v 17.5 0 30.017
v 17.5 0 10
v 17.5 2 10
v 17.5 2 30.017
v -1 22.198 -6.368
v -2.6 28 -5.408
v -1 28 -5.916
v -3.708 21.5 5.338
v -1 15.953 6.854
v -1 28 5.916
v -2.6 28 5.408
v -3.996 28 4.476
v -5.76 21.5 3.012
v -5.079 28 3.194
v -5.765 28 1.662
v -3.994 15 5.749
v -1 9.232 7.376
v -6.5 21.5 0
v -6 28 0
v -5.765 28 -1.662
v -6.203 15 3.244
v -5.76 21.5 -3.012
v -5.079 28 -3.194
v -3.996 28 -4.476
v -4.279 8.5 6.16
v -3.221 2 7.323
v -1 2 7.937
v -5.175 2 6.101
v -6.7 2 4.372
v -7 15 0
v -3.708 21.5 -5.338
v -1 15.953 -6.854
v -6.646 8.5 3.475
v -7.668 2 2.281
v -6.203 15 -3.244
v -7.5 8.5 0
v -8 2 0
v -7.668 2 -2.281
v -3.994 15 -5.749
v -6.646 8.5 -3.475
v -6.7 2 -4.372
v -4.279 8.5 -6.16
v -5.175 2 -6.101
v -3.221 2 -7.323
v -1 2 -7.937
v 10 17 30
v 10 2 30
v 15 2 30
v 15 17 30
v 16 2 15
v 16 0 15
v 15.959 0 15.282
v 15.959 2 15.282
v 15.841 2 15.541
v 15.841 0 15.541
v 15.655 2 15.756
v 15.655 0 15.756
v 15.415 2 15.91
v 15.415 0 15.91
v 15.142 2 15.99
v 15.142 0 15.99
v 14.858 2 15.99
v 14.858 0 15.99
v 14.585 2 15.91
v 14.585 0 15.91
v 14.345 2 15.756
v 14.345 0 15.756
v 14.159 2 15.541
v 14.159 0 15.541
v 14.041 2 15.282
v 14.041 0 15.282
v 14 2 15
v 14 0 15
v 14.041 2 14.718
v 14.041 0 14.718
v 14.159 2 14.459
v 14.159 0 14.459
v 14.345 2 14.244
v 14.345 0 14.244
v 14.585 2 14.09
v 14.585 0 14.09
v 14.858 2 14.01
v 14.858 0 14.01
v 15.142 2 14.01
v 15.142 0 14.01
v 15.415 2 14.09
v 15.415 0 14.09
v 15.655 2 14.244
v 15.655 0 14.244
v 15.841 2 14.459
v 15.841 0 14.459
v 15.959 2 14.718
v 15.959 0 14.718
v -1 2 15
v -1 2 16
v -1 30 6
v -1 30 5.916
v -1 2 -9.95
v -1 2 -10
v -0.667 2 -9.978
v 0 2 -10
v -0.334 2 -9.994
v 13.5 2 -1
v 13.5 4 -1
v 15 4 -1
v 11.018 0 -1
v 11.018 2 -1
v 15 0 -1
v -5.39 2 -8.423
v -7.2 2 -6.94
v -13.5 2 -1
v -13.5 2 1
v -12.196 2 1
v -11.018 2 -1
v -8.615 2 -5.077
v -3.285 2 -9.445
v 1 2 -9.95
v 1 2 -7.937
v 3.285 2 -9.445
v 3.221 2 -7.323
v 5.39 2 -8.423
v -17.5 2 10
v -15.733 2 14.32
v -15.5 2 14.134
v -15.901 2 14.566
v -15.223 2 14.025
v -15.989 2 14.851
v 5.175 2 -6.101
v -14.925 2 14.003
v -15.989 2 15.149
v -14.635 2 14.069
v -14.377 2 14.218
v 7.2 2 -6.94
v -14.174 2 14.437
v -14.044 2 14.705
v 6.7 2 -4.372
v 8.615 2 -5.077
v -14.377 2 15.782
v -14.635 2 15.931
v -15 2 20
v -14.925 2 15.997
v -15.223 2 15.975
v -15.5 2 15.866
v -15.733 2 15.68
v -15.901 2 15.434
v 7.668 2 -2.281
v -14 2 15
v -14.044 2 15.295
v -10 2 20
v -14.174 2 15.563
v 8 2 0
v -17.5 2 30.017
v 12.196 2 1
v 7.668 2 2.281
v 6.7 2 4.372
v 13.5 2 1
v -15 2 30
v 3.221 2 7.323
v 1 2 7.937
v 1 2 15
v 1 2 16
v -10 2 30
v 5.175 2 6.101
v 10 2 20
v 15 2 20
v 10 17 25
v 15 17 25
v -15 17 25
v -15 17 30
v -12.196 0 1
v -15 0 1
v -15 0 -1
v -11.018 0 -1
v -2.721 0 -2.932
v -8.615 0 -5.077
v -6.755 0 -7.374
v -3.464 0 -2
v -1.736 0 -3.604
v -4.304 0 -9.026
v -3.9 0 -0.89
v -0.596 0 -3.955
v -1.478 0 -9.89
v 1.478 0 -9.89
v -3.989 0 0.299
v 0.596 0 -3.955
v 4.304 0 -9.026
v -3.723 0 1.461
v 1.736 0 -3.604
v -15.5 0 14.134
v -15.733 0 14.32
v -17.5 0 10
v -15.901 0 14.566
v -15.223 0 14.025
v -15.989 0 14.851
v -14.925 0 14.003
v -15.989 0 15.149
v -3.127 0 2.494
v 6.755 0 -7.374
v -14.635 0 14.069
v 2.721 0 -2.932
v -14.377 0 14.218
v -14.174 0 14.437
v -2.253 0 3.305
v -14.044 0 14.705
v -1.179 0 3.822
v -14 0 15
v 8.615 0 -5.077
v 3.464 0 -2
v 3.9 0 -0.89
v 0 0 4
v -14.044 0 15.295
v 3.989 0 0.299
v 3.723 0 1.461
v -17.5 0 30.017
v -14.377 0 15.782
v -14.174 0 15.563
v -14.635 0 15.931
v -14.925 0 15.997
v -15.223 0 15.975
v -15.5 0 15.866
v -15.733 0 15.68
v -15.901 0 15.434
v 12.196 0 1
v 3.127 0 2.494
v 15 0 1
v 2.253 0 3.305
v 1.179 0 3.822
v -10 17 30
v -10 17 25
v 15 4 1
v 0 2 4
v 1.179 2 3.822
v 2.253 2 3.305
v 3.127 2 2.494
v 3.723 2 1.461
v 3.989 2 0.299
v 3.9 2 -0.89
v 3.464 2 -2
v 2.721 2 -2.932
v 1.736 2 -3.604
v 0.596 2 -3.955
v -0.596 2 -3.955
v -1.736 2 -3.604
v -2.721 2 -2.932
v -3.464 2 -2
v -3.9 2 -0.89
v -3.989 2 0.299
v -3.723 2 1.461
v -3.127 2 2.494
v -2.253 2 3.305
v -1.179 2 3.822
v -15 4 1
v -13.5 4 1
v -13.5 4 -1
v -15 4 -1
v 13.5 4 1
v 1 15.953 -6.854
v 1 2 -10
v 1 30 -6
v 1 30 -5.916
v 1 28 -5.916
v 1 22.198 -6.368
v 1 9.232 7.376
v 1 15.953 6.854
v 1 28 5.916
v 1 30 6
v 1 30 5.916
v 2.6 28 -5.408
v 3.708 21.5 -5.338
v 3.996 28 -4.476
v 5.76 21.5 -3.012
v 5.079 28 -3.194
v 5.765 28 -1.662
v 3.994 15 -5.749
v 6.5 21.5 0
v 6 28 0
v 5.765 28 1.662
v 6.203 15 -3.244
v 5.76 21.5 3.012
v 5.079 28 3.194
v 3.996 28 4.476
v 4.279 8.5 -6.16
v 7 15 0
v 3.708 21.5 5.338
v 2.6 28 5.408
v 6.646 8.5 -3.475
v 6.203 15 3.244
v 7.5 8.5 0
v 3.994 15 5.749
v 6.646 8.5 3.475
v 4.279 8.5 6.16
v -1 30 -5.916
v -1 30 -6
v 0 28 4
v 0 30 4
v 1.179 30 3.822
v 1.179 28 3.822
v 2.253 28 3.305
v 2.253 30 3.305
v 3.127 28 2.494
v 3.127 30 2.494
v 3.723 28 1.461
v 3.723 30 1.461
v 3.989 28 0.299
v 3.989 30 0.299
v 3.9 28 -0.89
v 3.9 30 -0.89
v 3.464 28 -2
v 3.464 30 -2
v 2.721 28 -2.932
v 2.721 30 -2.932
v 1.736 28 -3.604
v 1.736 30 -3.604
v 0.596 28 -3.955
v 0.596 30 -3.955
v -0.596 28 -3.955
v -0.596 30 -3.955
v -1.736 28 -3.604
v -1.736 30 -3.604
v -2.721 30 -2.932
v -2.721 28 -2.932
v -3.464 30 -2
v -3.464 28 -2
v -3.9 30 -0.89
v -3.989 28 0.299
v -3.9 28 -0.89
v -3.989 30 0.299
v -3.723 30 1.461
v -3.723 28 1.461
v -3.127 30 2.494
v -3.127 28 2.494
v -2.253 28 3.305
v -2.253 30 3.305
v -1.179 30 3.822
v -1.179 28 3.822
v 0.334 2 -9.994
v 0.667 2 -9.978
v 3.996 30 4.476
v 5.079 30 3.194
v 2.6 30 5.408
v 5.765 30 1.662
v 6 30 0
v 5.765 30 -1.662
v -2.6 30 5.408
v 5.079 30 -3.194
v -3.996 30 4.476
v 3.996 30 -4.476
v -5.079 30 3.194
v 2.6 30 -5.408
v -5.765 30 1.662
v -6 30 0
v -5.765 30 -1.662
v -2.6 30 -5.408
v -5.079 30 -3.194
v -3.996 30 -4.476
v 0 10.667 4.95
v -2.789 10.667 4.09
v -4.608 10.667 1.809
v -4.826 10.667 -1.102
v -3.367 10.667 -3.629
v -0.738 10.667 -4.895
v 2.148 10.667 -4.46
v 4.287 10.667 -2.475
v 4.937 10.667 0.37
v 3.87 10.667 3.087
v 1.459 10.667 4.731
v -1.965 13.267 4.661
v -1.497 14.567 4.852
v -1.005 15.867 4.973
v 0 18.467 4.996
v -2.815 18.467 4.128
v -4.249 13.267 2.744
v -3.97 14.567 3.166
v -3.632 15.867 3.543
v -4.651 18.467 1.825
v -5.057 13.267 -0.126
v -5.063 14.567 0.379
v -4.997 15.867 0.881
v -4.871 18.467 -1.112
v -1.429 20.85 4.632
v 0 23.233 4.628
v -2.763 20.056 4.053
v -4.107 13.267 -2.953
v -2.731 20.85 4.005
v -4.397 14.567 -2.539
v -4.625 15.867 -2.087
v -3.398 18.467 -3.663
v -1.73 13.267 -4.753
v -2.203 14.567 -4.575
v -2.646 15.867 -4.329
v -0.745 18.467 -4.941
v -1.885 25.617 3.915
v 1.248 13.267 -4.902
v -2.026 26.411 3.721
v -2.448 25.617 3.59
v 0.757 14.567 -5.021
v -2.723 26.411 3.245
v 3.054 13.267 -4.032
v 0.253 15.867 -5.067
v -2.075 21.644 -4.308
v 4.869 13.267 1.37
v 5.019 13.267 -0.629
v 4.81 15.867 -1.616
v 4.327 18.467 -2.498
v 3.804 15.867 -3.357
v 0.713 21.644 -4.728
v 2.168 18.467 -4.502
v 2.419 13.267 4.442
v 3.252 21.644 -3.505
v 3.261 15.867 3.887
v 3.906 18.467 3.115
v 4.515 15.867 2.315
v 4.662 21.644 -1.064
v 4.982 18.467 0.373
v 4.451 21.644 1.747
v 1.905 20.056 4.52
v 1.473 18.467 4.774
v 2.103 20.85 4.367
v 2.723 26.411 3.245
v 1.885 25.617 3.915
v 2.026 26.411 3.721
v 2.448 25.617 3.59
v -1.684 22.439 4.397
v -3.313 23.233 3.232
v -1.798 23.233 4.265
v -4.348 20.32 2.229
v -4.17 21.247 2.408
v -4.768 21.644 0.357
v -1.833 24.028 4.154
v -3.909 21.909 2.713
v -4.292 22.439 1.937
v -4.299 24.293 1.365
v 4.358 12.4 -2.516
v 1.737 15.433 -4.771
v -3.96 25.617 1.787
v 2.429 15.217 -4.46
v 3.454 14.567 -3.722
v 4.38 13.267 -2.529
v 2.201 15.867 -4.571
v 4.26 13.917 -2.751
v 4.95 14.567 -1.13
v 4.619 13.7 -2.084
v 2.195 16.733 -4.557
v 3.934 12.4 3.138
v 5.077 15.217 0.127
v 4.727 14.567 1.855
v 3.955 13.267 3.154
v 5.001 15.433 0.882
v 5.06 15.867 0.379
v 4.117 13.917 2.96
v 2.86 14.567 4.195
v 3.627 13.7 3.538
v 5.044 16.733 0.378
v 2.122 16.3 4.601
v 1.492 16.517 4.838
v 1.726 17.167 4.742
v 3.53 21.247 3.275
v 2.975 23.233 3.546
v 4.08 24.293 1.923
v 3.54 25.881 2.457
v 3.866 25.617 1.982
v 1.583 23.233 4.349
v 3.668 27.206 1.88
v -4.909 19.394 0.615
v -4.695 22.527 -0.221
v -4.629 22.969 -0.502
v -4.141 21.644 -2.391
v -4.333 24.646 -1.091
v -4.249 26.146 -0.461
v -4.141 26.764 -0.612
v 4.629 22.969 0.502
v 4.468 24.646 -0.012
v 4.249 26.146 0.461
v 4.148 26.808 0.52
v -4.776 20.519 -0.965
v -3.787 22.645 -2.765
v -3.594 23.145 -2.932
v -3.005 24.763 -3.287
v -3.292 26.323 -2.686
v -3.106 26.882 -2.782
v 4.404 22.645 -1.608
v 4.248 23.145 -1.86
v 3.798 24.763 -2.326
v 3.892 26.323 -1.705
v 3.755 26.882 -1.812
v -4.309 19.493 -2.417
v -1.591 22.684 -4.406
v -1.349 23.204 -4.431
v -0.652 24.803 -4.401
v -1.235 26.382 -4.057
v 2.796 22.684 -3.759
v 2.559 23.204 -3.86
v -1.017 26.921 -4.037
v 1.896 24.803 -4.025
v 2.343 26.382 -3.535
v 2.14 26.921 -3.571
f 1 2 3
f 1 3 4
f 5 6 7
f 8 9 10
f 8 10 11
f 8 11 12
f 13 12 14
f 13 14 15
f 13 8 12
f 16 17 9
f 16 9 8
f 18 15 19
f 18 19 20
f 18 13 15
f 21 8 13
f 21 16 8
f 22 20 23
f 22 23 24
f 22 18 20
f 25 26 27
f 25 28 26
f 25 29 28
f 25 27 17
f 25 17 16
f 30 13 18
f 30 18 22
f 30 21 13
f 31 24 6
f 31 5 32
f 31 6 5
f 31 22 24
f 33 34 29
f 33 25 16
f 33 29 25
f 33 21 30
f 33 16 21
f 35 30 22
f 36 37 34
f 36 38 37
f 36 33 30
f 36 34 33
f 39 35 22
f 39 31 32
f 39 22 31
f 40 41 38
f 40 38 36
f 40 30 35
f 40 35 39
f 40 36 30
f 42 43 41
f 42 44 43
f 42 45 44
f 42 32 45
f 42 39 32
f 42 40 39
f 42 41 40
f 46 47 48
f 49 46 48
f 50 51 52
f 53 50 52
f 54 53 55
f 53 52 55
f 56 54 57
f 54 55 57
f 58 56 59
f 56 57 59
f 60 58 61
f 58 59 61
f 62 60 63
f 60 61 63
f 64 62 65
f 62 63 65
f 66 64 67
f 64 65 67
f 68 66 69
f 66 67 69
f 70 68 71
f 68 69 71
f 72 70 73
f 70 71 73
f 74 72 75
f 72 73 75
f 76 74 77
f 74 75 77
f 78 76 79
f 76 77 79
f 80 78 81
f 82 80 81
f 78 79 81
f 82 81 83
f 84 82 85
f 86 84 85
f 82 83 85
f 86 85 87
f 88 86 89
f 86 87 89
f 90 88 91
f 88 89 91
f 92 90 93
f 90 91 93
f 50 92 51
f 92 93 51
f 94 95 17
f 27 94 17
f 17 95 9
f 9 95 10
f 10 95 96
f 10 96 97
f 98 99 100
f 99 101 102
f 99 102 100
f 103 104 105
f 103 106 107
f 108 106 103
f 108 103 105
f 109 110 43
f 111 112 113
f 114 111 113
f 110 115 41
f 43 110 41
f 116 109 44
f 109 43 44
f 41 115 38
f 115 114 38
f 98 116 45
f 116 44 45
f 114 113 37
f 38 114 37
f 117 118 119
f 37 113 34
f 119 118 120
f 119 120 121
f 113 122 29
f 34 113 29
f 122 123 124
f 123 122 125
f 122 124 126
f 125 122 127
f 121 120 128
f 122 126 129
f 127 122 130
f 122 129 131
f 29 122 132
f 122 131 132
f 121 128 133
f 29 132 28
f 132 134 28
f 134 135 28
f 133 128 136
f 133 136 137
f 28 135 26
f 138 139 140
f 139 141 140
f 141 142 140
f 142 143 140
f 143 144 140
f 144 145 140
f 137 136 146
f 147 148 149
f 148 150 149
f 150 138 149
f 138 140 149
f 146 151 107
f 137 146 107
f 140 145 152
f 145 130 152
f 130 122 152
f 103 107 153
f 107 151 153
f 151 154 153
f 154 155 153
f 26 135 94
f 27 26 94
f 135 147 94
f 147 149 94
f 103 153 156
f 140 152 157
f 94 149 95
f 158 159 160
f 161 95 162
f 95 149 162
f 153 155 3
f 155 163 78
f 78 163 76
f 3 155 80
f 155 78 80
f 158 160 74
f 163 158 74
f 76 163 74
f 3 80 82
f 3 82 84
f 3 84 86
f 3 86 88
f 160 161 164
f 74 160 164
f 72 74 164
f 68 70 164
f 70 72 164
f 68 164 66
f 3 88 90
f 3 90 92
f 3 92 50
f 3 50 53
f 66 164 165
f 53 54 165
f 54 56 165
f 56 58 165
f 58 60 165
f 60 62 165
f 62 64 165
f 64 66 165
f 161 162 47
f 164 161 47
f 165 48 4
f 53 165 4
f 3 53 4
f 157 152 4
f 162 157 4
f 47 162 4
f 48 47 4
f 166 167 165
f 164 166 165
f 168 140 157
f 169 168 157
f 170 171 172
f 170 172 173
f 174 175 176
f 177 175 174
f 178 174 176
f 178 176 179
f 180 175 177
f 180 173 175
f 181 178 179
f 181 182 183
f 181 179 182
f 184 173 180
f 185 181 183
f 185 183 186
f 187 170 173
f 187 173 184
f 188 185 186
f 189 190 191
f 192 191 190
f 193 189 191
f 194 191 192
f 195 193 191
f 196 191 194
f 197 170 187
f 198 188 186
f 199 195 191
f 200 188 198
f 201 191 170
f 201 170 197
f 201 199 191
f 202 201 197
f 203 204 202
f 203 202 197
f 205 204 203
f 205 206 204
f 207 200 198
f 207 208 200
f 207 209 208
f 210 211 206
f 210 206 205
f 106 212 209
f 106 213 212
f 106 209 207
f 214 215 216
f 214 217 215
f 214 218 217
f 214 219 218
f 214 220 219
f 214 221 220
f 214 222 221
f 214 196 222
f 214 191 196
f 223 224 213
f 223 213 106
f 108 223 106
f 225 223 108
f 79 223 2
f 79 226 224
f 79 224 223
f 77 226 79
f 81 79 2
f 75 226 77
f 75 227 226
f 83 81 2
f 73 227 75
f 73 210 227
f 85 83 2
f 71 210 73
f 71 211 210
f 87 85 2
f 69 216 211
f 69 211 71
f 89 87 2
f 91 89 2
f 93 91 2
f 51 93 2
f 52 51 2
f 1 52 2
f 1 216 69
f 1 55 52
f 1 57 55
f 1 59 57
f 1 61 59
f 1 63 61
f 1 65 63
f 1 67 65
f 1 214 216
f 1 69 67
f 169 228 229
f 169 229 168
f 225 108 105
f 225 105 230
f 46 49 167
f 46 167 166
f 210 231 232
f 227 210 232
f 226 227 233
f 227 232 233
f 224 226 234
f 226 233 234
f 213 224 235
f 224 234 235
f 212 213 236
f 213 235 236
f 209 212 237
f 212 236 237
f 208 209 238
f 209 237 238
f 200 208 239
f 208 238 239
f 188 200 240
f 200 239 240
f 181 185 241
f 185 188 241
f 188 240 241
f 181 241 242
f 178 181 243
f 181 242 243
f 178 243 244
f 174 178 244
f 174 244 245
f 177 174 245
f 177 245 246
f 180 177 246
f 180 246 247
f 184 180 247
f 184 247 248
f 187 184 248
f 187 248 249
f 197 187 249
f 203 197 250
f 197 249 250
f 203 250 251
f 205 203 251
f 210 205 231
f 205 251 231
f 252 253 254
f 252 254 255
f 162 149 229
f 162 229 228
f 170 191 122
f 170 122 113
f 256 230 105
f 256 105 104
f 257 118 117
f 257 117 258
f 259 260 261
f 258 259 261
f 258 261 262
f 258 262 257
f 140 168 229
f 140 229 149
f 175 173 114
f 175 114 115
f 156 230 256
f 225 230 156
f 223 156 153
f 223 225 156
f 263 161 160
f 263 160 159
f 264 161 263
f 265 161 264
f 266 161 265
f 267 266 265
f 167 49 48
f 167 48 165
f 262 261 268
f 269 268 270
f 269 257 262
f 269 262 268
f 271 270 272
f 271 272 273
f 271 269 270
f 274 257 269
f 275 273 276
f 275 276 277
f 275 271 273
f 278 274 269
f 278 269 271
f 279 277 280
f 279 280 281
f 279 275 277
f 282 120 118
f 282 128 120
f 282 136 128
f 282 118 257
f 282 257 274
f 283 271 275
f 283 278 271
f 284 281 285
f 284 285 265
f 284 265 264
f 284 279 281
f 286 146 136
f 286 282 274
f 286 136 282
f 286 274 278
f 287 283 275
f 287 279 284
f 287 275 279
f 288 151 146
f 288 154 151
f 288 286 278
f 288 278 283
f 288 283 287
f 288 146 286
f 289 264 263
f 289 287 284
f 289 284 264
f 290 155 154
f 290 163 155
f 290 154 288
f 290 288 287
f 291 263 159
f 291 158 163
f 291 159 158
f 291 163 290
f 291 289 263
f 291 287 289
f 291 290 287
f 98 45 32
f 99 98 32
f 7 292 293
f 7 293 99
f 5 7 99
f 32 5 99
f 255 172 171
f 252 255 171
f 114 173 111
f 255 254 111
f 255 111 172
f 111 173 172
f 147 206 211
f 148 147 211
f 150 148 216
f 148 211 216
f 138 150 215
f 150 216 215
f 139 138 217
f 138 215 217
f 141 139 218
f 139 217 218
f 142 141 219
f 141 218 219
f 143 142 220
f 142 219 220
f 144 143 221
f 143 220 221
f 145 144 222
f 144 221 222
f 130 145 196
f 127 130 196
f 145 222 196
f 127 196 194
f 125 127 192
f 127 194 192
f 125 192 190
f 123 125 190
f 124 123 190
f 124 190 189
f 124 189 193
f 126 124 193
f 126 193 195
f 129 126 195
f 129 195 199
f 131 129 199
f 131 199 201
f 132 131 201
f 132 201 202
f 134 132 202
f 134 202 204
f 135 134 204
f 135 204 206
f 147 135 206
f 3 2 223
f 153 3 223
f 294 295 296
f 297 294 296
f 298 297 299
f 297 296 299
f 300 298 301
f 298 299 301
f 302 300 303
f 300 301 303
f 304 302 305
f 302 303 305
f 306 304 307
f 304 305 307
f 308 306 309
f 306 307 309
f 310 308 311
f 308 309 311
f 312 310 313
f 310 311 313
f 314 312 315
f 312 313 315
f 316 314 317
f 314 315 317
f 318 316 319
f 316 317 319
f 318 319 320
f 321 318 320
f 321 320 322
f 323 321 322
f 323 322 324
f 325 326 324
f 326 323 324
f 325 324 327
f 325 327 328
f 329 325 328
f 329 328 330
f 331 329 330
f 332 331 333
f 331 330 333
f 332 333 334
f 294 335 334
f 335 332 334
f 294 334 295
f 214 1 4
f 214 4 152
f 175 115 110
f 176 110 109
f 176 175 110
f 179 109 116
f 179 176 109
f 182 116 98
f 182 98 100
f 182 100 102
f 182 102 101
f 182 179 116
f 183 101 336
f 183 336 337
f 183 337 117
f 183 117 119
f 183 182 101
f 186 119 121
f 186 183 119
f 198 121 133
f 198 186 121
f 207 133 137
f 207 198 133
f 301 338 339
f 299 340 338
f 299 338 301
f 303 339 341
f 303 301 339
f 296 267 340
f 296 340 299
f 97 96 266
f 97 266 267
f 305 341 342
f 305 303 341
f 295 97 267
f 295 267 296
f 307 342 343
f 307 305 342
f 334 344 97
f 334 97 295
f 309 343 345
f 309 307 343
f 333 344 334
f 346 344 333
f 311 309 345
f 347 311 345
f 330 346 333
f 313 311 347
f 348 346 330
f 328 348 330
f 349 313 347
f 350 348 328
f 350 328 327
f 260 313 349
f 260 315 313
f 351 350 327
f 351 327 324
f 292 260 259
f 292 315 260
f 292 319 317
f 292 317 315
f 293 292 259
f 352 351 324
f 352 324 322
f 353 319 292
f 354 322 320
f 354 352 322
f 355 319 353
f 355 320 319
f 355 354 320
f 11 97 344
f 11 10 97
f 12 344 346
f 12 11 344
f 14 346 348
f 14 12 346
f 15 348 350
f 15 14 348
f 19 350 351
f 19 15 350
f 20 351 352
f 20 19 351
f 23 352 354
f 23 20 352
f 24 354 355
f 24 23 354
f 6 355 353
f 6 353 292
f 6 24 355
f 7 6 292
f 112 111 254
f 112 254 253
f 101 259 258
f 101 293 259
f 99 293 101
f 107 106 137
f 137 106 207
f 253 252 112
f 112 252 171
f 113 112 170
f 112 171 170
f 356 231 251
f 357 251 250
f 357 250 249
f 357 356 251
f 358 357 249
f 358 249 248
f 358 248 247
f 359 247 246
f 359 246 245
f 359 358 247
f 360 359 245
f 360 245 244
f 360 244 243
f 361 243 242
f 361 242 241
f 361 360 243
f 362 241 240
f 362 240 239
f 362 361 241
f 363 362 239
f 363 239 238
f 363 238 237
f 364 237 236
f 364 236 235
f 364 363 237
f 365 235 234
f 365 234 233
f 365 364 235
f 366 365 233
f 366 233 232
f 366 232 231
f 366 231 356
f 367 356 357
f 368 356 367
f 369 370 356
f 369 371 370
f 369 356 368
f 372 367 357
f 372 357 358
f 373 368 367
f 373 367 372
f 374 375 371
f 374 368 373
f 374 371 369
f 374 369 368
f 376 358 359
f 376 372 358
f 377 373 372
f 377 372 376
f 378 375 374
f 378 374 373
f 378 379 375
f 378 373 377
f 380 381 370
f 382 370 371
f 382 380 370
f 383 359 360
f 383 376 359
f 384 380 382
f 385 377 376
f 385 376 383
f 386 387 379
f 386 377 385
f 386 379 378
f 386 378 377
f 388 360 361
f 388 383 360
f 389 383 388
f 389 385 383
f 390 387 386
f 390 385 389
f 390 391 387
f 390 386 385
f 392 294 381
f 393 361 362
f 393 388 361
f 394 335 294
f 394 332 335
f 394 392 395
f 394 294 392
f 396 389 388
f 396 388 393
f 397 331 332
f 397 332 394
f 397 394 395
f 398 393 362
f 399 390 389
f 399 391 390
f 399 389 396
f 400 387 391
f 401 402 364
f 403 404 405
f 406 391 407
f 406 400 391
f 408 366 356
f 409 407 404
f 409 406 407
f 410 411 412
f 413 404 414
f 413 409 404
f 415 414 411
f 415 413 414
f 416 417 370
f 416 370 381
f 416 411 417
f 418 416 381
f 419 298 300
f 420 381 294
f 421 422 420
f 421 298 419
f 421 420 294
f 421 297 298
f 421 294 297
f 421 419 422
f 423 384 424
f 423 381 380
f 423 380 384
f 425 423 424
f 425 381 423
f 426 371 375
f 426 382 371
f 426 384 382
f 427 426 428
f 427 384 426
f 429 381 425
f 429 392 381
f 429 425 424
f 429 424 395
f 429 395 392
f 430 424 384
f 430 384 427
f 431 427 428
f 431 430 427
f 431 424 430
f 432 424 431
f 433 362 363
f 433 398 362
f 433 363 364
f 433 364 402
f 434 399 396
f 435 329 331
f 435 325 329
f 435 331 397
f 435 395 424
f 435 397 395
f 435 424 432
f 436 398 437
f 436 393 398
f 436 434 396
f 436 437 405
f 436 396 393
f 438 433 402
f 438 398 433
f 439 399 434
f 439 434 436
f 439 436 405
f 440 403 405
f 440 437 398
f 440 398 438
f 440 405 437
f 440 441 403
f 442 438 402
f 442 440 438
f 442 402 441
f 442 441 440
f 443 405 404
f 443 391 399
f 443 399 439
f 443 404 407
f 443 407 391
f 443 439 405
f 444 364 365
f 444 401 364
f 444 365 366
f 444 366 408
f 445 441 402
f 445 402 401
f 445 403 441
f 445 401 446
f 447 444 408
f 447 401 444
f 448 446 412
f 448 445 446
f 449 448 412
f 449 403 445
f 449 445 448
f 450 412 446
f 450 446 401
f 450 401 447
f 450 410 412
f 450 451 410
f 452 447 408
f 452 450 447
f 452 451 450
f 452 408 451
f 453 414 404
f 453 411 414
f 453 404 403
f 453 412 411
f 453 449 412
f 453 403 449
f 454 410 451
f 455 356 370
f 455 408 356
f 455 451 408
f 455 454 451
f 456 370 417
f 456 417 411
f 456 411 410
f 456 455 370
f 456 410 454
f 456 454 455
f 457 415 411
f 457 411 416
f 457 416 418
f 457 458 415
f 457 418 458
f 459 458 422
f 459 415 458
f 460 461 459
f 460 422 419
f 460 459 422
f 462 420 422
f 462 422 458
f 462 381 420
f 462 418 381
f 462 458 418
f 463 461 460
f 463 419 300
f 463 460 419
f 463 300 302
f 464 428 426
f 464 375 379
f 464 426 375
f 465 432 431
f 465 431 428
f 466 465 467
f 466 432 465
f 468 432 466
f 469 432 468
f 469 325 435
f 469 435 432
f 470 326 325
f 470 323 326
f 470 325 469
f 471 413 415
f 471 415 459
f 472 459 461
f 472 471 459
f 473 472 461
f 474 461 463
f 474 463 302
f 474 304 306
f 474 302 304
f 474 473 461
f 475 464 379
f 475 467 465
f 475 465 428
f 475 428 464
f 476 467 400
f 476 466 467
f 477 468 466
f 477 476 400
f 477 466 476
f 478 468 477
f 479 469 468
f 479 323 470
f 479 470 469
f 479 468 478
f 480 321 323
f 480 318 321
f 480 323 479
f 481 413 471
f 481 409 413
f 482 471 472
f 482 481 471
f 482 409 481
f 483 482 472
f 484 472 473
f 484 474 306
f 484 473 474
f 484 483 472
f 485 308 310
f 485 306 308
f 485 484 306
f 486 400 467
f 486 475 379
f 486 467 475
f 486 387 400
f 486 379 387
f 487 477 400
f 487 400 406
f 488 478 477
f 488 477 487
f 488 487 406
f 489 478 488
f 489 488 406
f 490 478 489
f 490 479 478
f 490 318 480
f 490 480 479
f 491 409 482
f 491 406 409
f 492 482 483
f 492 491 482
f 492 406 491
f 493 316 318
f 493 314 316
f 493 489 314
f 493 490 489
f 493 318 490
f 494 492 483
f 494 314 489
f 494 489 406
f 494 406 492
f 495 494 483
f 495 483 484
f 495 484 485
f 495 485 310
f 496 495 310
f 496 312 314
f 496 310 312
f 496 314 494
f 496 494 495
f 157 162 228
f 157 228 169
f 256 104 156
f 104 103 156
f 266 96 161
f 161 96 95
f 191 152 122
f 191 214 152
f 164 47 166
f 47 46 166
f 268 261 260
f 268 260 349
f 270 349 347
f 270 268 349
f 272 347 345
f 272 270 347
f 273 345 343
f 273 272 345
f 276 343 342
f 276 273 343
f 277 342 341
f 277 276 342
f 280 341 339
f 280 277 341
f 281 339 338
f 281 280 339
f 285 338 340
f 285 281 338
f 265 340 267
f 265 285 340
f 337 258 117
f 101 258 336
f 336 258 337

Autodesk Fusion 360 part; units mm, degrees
sketch "Sketch1" plane through (0, 0, 0) normal (1, 0, 0) x (0, 0, -1)
  line L0 (0, 0) -> (-4, 0)
  line L1 (-4, 0) -> (-4, 30)
  line L2 (-4, 30) -> (0, 30)
  line L3 (0, 30) -> (0, 0)
  line L4 (-4, 30) -> (-8, 30)
  line L5 (-8, 30) -> (-8, 0)
  line L6 (-8, 0) -> (-4, 0)
  line L7 (-4, 0) -> (-4, 30)
  line L8 (-4, 30) -> (-6, 30)
  line L9 (-6, 30) -> (-6, 28)
  line L10 (-6, 28) -> (-4, 28)
  line L11 (-4, 28) -> (-4, 30)
  line L12 (-4, 0) -> (-8, 0)
  line L13 (-8, 0) -> (-8, 2)
  line L14 (-8, 2) -> (-4, 2)
  line L15 (-4, 2) -> (-4, 0)
  line L16 (-6, 28) -> (-8, 2)
  spline S0 degree 5 poles (-4, 2) (-4.0818, 2.52) (-4.2384, 3.56) (-4.4517, 5.12) (-4.6926, 7.2) (-4.9161, 9.8) (-5.0551, 12.4) (-5.1027, 15) (-5.0551, 17.6) (-4.9161, 20.2) (-4.6926, 22.8) (-4.4517, 24.88) (-4.2384, 26.44) (-4.0818, 27.48) (-4, 28) knots 0 0 0 0 0 0 0.1 0.2 0.3 0.4 0.5 0.6 0.7 0.8 0.9 1 1 1 1 1 1
  point P0 (-5.079, 15)
  dimension "d1" = 4
  dimension "d2" = 30
  dimension "d3" = 4
  dimension "d4" = 30
  dimension "d5" = 2
  dimension "d6" = 2
  dimension "d7" = 2
revolve "Revolve1" add sketch "Sketch1" angle 360 about axis through (0, 30, 0) along (0, -1, 0) contours L1 L5 L6 L7 L12 L13 L14 L15 | L10 L14 L16 S0 | L1 L4 L7 L8 L9 L10 L11
sketch "Sketch2" plane through (0, 0, 0) normal (0, -1, 0) x (1, 0, 0)
  circle A0 centre (0, 0) radius 4
  circle A1 centre (0, 0) radius 8
  line L0 (0, 0) -> (10, 0)
  line L1 (10, 0) -> (10, 10)
  line L2 (10, 10) -> (0, 10)
  line L3 (0, 10) -> (0, 0)
  line L4 (0, 0) -> (-10, 0)
  line L5 (-10, 0) -> (-10, 10)
  line L6 (-10, 10) -> (0, 10)
  line L7 (0, 10) -> (0, 0)
  line L8 (0, 0) -> (-10, 0)
  line L9 (-10, 0) -> (-10, -10)
  line L10 (-10, -10) -> (0, -10)
  line L11 (0, -10) -> (0, 0)
  line L12 (0, 0) -> (10, 0)
  line L13 (10, 0) -> (10, -10)
  line L14 (10, -10) -> (0, -10)
  line L15 (0, -10) -> (0, 0)
  line L16 (0, 15) -> (-15, 15)
  line L17 (-15, 15) -> (0, 15)
  line L18 (0, 15) -> (15, 15)
  line L19 (-17.5, 17.5) -> (17.5, 17.5)
  line L20 (17.5, 17.5) -> (17.5, 10)
  line L21 (17.5, 10) -> (-17.5, 10)
  line L22 (-17.5, 10) -> (-17.5, 17.5)
  circle A2 centre (-15, 15) radius 1
  circle A3 centre (15, 15) radius 1
  line L23 (-10, -8) -> (10, -8)
  circle A4 centre (0, 0) radius 10
  dimension "d9" = 15
  dimension "d10" = 15
  dimension "d11" = 2
  dimension "d12" = 2
extrude "Extrude1" add sketch "Sketch2" against normal blind 2 contours A1 L0 L12 L23 A4 | A1 L0 L3 L7 L12 A4 | A1 L3 L4 L7 L8 A4 | A1 L4 L8 L23 A4 | L11 L15 L23 A4 | L11 L15 L23 A4 | L1 L2 L21 A4 | L2 L6 L19 L20 L21 L22 | L5 L6 L21 A4
sketch "Sketch3" plane through (0, 0, 0) normal (1, 0, 0) x (0, 0, -1)
  line L0 (-6, 30) -> (-16, 2)
  line L1 (-16, 2) -> (-7, 2)
  line L2 (-7, 2) -> (-5, 28)
  line L3 (-5, 28) -> (-5, 30)
  line L4 (-5, 30) -> (-6, 30)
extrude "Extrude2" add sketch "Sketch3" along normal mid plane 2
sketch "Sketch4" plane through (0, 0, 0) normal (1, 0, 0) x (0, 0, -1)
  line L0 (6, 30) -> (10, 2)
  line L1 (10, 2) -> (7, 2)
  line L2 (7, 2) -> (5, 28)
  line L3 (5, 28) -> (5, 30)
  line L4 (5, 30) -> (6, 30)
extrude "Extrude3" add sketch "Sketch4" along normal mid plane 2
sketch "Sketch5" plane through (0, 0, 0) normal (0, -1, 0) x (1, 0, 0)
  arc A0 (-10, 0) -> (10, 0) centre (0, 0) ccw
  line L0 (10, 0) -> (10, 10)
  line L1 (10, 10) -> (17.5, 10)
  line L2 (17.5, 10) -> (17.5, 17.5)
  line L3 (17.5, 17.5) -> (-17.5, 17.5)
  line L4 (-17.5, 17.5) -> (-17.5, 10)
  line L5 (-17.5, 10) -> (-10, 10)
  line L6 (-10, 10) -> (-10, 0)
  circle A1 centre (15, 15) radius 1
  circle A2 centre (-15, 15) radius 1
  circle A3 centre (0, 0) radius 4
  line L7 (-17.5, 10) -> (-8.6154, -5.0769)
  line L8 (17.5, 10) -> (8.6154, -5.0769)
extrude "Extrude4" add sketch "Sketch5" against normal blind 2 contours A0 L5 L6 L7 | A0 L0 L1 L8
sketch "Sketch6" plane through (0, 0, 0) normal (0, -1, 0) x (1, 0, 0)
  arc A0 (-8.6154, -5.0769) -> (8.6154, -5.0769) centre (0, 0) ccw
  line L0 (8.6154, -5.0769) -> (17.5, 10)
  line L1 (17.5, 10) -> (17.5, 17.5)
  line L2 (17.5, 17.5) -> (-17.5, 17.5)
  line L3 (-17.5, 17.5) -> (-17.5, 10)
  line L4 (-17.5, 10) -> (-8.6154, -5.0769)
  circle A1 centre (15, 15) radius 1
  circle A2 centre (-15, 15) radius 1
  circle A3 centre (0, 0) radius 4
  line L5 (10, -1) -> (15, -1)
  line L6 (15, -1) -> (15, 1)
  line L7 (15, 1) -> (10, 1)
  line L8 (10, 1) -> (10, -1)
  line L9 (-10, -1) -> (-15, -1)
  line L10 (-15, -1) -> (-15, 1)
  line L11 (-15, 1) -> (-10, 1)
  line L12 (-10, 1) -> (-10, -1)
extrude "Extrude5" add sketch "Sketch6" against normal blind 2 contours L4 L9 L10 L11 | L0 L5 L6 L7
sketch "Sketch7" plane through (0, 2, 0) normal (0, 1, 0) x (-1, 0, 0)
  line L0 (1, -7.9373) -> (1, -9.9499)
  arc A0 (1, -9.9499) -> (8.6154, -5.0769) centre (0, 0) ccw
  line L1 (8.6154, -5.0769) -> (11.0179, -1)
  line L2 (11.0179, -1) -> (15, -1)
  line L3 (15, -1) -> (15, 1)
  line L4 (15, 1) -> (12.1964, 1)
  line L5 (12.1964, 1) -> (17.5, 10)
  line L6 (17.5, 10) -> (17.5, 17.5)
  line L7 (17.5, 17.5) -> (-17.5, 17.5)
  line L8 (-17.5, 17.5) -> (-17.5, 10)
  line L9 (-17.5, 10) -> (-12.1964, 1)
  line L10 (-12.1964, 1) -> (-15, 1)
  line L11 (-15, 1) -> (-15, -1)
  line L12 (-15, -1) -> (-11.0179, -1)
  line L13 (-11.0179, -1) -> (-8.6154, -5.0769)
  arc A1 (-8.6154, -5.0769) -> (-1, -9.9499) centre (0, 0) ccw
  line L14 (-1, -9.9499) -> (-1, -7.9373)
  arc A2 (-1, 7.9373) -> (-1, -7.9373) centre (0, 0) ccw
  line L15 (-1, 7.9373) -> (-1, 16)
  line L16 (-1, 16) -> (1, 16)
  line L17 (1, 16) -> (1, 7.9373)
  arc A3 (1, -7.9373) -> (1, 7.9373) centre (0, 0) ccw
  circle A4 centre (15, 15) radius 1
  circle A5 centre (-15, 15) radius 1
  line L18 (15, -1) -> (13.5, -1)
  line L19 (13.5, -1) -> (13.5, 1)
  line L20 (13.5, 1) -> (15, 1)
  line L21 (15, 1) -> (15, -1)
  line L22 (-15, -1) -> (-13.5, -1)
  line L23 (-13.5, -1) -> (-13.5, 1)
  line L24 (-13.5, 1) -> (-15, 1)
  line L25 (-15, 1) -> (-15, -1)
  dimension "d23" = 1.5
  dimension "d24" = 1.5
extrude "Extrude6" add sketch "Sketch7" along normal blind 2 contours L2 L3 L4 L18 L19 L20 L21 | L10 L11 L12 L22 L23 L24 L25
sketch "Sketch8" plane through (0, 0, 0) normal (0, -1, 0) x (1, 0, 0)
  arc A0 (-8.6154, -5.0769) -> (8.6154, -5.0769) centre (0, 0) ccw
  line L0 (8.6154, -5.0769) -> (11.0179, -1)
  line L1 (11.0179, -1) -> (15, -1)
  line L2 (15, -1) -> (15, 1)
  line L3 (15, 1) -> (12.1964, 1)
  line L4 (12.1964, 1) -> (17.5, 10)
  line L5 (17.5, 10) -> (17.5, 17.5)
  line L6 (17.5, 17.5) -> (-17.5, 17.5)
  line L7 (-17.5, 17.5) -> (-17.5, 10)
  line L8 (-17.5, 10) -> (-12.1964, 1)
  line L9 (-12.1964, 1) -> (-15, 1)
  line L10 (-15, 1) -> (-15, -1)
  line L11 (-15, -1) -> (-11.0179, -1)
  line L12 (-11.0179, -1) -> (-8.6154, -5.0769)
  circle A1 centre (15, 15) radius 1
  circle A2 centre (-15, 15) radius 1
  circle A3 centre (0, 0) radius 4
  line L13 (-17.5, 15.0174) -> (17.5, 15.0174)
  line L14 (17.5, 15.0174) -> (17.5, 30.0174)
  line L15 (17.5, 30.0174) -> (-17.5, 30.0174)
  line L16 (-17.5, 30.0174) -> (-17.5, 15.0174)
  dimension "d27" = 35
  dimension "d28" = 15
extrude "Extrude7" add sketch "Sketch8" against normal blind 2 contours L6 L14 L15 L16
sketch "Sketch9" plane through (0, 2, 0) normal (0, 1, 0) x (-1, 0, 0)
  circle A0 centre (-15, 15) radius 1
  circle A1 centre (15, 15) radius 1
  line L0 (13.5, -1) -> (13.5, 1)
  line L1 (13.5, 1) -> (12.1964, 1)
  line L2 (12.1964, 1) -> (17.5, 10)
  line L3 (17.5, 10) -> (17.5, 30.0174)
  line L4 (17.5, 30.0174) -> (-17.5, 30.0174)
  line L5 (-17.5, 30.0174) -> (-17.5, 10)
  line L6 (-17.5, 10) -> (-12.1964, 1)
  line L7 (-12.1964, 1) -> (-13.5, 1)
  line L8 (-13.5, 1) -> (-13.5, -1)
  line L9 (-13.5, -1) -> (-11.0179, -1)
  line L10 (-11.0179, -1) -> (-8.6154, -5.0769)
  arc A2 (-8.6154, -5.0769) -> (-1, -9.9499) centre (0, 0) ccw
  line L11 (-1, -9.9499) -> (-1, -7.9373)
  arc A3 (-1, 7.9373) -> (-1, -7.9373) centre (0, 0) ccw
  line L12 (-1, 7.9373) -> (-1, 16)
  line L13 (-1, 16) -> (1, 16)
  line L14 (1, 16) -> (1, 7.9373)
  arc A4 (1, -7.9373) -> (1, 7.9373) centre (0, 0) ccw
  line L15 (1, -7.9373) -> (1, -9.9499)
  arc A5 (1, -9.9499) -> (8.6154, -5.0769) centre (0, 0) ccw
  line L16 (8.6154, -5.0769) -> (11.0179, -1)
  line L17 (11.0179, -1) -> (13.5, -1)
  line L18 (15, 25) -> (10, 25)
  line L19 (10, 25) -> (10, 30)
  line L20 (10, 30) -> (15, 30)
  line L21 (15, 30) -> (15, 25)
  line L22 (-15, 25) -> (-10, 25)
  line L23 (-10, 25) -> (-10, 30)
  line L24 (-10, 30) -> (-15, 30)
  line L25 (-15, 30) -> (-15, 25)
  line L26 (-10, 25) -> (-1, 7.9373)
  line L27 (-15, 25) -> (-5.0752, 6.184)
  line L28 (10, 25) -> (1, 7.9373)
  line L29 (15, 25) -> (5.0752, 6.184)
  dimension "d31" = 5
  dimension "d32" = 5
extrude "Extrude8" add sketch "Sketch9" along normal blind 15 contours L18 L19 L20 L21 | L22 L23 L24 L25
sketch "Sketch10" plane through (15, 0, 0) normal (1, 0, 0) x (0, 0, -1)
  line L0 (-30, 2) -> (-25, 2)
  line L1 (-25, 2) -> (-25, 17)
  line L2 (-25, 17) -> (-30, 17)
  line L3 (-30, 17) -> (-30, 2)
  line L4 (-25, 17) -> (-20, 17)
  line L5 (-20, 17) -> (-20, 2)
  line L6 (-20, 2) -> (-25, 2)
  line L7 (-25, 2) -> (-25, 17)
  line L8 (-25, 17) -> (-20, 2)
extrude "Extrude9" add sketch "Sketch10" against normal blind 5 contours L1 L6 L7 L8
sketch "Sketch11" plane through (-15, 0, 0) normal (-1, 0, 0) x (0, 0, 1)
  line L0 (25, 2) -> (30, 2)
  line L1 (30, 2) -> (30, 17)
  line L2 (30, 17) -> (25, 17)
  line L3 (25, 17) -> (25, 2)
  line L4 (25, 17) -> (20, 17)
  line L5 (20, 17) -> (20, 2)
  line L6 (20, 2) -> (25, 2)
  line L7 (25, 2) -> (25, 17)
  line L8 (25, 17) -> (20, 2)
extrude "Extrude10" add sketch "Sketch11" against normal blind 5 contours L3 L6 L7 L8
